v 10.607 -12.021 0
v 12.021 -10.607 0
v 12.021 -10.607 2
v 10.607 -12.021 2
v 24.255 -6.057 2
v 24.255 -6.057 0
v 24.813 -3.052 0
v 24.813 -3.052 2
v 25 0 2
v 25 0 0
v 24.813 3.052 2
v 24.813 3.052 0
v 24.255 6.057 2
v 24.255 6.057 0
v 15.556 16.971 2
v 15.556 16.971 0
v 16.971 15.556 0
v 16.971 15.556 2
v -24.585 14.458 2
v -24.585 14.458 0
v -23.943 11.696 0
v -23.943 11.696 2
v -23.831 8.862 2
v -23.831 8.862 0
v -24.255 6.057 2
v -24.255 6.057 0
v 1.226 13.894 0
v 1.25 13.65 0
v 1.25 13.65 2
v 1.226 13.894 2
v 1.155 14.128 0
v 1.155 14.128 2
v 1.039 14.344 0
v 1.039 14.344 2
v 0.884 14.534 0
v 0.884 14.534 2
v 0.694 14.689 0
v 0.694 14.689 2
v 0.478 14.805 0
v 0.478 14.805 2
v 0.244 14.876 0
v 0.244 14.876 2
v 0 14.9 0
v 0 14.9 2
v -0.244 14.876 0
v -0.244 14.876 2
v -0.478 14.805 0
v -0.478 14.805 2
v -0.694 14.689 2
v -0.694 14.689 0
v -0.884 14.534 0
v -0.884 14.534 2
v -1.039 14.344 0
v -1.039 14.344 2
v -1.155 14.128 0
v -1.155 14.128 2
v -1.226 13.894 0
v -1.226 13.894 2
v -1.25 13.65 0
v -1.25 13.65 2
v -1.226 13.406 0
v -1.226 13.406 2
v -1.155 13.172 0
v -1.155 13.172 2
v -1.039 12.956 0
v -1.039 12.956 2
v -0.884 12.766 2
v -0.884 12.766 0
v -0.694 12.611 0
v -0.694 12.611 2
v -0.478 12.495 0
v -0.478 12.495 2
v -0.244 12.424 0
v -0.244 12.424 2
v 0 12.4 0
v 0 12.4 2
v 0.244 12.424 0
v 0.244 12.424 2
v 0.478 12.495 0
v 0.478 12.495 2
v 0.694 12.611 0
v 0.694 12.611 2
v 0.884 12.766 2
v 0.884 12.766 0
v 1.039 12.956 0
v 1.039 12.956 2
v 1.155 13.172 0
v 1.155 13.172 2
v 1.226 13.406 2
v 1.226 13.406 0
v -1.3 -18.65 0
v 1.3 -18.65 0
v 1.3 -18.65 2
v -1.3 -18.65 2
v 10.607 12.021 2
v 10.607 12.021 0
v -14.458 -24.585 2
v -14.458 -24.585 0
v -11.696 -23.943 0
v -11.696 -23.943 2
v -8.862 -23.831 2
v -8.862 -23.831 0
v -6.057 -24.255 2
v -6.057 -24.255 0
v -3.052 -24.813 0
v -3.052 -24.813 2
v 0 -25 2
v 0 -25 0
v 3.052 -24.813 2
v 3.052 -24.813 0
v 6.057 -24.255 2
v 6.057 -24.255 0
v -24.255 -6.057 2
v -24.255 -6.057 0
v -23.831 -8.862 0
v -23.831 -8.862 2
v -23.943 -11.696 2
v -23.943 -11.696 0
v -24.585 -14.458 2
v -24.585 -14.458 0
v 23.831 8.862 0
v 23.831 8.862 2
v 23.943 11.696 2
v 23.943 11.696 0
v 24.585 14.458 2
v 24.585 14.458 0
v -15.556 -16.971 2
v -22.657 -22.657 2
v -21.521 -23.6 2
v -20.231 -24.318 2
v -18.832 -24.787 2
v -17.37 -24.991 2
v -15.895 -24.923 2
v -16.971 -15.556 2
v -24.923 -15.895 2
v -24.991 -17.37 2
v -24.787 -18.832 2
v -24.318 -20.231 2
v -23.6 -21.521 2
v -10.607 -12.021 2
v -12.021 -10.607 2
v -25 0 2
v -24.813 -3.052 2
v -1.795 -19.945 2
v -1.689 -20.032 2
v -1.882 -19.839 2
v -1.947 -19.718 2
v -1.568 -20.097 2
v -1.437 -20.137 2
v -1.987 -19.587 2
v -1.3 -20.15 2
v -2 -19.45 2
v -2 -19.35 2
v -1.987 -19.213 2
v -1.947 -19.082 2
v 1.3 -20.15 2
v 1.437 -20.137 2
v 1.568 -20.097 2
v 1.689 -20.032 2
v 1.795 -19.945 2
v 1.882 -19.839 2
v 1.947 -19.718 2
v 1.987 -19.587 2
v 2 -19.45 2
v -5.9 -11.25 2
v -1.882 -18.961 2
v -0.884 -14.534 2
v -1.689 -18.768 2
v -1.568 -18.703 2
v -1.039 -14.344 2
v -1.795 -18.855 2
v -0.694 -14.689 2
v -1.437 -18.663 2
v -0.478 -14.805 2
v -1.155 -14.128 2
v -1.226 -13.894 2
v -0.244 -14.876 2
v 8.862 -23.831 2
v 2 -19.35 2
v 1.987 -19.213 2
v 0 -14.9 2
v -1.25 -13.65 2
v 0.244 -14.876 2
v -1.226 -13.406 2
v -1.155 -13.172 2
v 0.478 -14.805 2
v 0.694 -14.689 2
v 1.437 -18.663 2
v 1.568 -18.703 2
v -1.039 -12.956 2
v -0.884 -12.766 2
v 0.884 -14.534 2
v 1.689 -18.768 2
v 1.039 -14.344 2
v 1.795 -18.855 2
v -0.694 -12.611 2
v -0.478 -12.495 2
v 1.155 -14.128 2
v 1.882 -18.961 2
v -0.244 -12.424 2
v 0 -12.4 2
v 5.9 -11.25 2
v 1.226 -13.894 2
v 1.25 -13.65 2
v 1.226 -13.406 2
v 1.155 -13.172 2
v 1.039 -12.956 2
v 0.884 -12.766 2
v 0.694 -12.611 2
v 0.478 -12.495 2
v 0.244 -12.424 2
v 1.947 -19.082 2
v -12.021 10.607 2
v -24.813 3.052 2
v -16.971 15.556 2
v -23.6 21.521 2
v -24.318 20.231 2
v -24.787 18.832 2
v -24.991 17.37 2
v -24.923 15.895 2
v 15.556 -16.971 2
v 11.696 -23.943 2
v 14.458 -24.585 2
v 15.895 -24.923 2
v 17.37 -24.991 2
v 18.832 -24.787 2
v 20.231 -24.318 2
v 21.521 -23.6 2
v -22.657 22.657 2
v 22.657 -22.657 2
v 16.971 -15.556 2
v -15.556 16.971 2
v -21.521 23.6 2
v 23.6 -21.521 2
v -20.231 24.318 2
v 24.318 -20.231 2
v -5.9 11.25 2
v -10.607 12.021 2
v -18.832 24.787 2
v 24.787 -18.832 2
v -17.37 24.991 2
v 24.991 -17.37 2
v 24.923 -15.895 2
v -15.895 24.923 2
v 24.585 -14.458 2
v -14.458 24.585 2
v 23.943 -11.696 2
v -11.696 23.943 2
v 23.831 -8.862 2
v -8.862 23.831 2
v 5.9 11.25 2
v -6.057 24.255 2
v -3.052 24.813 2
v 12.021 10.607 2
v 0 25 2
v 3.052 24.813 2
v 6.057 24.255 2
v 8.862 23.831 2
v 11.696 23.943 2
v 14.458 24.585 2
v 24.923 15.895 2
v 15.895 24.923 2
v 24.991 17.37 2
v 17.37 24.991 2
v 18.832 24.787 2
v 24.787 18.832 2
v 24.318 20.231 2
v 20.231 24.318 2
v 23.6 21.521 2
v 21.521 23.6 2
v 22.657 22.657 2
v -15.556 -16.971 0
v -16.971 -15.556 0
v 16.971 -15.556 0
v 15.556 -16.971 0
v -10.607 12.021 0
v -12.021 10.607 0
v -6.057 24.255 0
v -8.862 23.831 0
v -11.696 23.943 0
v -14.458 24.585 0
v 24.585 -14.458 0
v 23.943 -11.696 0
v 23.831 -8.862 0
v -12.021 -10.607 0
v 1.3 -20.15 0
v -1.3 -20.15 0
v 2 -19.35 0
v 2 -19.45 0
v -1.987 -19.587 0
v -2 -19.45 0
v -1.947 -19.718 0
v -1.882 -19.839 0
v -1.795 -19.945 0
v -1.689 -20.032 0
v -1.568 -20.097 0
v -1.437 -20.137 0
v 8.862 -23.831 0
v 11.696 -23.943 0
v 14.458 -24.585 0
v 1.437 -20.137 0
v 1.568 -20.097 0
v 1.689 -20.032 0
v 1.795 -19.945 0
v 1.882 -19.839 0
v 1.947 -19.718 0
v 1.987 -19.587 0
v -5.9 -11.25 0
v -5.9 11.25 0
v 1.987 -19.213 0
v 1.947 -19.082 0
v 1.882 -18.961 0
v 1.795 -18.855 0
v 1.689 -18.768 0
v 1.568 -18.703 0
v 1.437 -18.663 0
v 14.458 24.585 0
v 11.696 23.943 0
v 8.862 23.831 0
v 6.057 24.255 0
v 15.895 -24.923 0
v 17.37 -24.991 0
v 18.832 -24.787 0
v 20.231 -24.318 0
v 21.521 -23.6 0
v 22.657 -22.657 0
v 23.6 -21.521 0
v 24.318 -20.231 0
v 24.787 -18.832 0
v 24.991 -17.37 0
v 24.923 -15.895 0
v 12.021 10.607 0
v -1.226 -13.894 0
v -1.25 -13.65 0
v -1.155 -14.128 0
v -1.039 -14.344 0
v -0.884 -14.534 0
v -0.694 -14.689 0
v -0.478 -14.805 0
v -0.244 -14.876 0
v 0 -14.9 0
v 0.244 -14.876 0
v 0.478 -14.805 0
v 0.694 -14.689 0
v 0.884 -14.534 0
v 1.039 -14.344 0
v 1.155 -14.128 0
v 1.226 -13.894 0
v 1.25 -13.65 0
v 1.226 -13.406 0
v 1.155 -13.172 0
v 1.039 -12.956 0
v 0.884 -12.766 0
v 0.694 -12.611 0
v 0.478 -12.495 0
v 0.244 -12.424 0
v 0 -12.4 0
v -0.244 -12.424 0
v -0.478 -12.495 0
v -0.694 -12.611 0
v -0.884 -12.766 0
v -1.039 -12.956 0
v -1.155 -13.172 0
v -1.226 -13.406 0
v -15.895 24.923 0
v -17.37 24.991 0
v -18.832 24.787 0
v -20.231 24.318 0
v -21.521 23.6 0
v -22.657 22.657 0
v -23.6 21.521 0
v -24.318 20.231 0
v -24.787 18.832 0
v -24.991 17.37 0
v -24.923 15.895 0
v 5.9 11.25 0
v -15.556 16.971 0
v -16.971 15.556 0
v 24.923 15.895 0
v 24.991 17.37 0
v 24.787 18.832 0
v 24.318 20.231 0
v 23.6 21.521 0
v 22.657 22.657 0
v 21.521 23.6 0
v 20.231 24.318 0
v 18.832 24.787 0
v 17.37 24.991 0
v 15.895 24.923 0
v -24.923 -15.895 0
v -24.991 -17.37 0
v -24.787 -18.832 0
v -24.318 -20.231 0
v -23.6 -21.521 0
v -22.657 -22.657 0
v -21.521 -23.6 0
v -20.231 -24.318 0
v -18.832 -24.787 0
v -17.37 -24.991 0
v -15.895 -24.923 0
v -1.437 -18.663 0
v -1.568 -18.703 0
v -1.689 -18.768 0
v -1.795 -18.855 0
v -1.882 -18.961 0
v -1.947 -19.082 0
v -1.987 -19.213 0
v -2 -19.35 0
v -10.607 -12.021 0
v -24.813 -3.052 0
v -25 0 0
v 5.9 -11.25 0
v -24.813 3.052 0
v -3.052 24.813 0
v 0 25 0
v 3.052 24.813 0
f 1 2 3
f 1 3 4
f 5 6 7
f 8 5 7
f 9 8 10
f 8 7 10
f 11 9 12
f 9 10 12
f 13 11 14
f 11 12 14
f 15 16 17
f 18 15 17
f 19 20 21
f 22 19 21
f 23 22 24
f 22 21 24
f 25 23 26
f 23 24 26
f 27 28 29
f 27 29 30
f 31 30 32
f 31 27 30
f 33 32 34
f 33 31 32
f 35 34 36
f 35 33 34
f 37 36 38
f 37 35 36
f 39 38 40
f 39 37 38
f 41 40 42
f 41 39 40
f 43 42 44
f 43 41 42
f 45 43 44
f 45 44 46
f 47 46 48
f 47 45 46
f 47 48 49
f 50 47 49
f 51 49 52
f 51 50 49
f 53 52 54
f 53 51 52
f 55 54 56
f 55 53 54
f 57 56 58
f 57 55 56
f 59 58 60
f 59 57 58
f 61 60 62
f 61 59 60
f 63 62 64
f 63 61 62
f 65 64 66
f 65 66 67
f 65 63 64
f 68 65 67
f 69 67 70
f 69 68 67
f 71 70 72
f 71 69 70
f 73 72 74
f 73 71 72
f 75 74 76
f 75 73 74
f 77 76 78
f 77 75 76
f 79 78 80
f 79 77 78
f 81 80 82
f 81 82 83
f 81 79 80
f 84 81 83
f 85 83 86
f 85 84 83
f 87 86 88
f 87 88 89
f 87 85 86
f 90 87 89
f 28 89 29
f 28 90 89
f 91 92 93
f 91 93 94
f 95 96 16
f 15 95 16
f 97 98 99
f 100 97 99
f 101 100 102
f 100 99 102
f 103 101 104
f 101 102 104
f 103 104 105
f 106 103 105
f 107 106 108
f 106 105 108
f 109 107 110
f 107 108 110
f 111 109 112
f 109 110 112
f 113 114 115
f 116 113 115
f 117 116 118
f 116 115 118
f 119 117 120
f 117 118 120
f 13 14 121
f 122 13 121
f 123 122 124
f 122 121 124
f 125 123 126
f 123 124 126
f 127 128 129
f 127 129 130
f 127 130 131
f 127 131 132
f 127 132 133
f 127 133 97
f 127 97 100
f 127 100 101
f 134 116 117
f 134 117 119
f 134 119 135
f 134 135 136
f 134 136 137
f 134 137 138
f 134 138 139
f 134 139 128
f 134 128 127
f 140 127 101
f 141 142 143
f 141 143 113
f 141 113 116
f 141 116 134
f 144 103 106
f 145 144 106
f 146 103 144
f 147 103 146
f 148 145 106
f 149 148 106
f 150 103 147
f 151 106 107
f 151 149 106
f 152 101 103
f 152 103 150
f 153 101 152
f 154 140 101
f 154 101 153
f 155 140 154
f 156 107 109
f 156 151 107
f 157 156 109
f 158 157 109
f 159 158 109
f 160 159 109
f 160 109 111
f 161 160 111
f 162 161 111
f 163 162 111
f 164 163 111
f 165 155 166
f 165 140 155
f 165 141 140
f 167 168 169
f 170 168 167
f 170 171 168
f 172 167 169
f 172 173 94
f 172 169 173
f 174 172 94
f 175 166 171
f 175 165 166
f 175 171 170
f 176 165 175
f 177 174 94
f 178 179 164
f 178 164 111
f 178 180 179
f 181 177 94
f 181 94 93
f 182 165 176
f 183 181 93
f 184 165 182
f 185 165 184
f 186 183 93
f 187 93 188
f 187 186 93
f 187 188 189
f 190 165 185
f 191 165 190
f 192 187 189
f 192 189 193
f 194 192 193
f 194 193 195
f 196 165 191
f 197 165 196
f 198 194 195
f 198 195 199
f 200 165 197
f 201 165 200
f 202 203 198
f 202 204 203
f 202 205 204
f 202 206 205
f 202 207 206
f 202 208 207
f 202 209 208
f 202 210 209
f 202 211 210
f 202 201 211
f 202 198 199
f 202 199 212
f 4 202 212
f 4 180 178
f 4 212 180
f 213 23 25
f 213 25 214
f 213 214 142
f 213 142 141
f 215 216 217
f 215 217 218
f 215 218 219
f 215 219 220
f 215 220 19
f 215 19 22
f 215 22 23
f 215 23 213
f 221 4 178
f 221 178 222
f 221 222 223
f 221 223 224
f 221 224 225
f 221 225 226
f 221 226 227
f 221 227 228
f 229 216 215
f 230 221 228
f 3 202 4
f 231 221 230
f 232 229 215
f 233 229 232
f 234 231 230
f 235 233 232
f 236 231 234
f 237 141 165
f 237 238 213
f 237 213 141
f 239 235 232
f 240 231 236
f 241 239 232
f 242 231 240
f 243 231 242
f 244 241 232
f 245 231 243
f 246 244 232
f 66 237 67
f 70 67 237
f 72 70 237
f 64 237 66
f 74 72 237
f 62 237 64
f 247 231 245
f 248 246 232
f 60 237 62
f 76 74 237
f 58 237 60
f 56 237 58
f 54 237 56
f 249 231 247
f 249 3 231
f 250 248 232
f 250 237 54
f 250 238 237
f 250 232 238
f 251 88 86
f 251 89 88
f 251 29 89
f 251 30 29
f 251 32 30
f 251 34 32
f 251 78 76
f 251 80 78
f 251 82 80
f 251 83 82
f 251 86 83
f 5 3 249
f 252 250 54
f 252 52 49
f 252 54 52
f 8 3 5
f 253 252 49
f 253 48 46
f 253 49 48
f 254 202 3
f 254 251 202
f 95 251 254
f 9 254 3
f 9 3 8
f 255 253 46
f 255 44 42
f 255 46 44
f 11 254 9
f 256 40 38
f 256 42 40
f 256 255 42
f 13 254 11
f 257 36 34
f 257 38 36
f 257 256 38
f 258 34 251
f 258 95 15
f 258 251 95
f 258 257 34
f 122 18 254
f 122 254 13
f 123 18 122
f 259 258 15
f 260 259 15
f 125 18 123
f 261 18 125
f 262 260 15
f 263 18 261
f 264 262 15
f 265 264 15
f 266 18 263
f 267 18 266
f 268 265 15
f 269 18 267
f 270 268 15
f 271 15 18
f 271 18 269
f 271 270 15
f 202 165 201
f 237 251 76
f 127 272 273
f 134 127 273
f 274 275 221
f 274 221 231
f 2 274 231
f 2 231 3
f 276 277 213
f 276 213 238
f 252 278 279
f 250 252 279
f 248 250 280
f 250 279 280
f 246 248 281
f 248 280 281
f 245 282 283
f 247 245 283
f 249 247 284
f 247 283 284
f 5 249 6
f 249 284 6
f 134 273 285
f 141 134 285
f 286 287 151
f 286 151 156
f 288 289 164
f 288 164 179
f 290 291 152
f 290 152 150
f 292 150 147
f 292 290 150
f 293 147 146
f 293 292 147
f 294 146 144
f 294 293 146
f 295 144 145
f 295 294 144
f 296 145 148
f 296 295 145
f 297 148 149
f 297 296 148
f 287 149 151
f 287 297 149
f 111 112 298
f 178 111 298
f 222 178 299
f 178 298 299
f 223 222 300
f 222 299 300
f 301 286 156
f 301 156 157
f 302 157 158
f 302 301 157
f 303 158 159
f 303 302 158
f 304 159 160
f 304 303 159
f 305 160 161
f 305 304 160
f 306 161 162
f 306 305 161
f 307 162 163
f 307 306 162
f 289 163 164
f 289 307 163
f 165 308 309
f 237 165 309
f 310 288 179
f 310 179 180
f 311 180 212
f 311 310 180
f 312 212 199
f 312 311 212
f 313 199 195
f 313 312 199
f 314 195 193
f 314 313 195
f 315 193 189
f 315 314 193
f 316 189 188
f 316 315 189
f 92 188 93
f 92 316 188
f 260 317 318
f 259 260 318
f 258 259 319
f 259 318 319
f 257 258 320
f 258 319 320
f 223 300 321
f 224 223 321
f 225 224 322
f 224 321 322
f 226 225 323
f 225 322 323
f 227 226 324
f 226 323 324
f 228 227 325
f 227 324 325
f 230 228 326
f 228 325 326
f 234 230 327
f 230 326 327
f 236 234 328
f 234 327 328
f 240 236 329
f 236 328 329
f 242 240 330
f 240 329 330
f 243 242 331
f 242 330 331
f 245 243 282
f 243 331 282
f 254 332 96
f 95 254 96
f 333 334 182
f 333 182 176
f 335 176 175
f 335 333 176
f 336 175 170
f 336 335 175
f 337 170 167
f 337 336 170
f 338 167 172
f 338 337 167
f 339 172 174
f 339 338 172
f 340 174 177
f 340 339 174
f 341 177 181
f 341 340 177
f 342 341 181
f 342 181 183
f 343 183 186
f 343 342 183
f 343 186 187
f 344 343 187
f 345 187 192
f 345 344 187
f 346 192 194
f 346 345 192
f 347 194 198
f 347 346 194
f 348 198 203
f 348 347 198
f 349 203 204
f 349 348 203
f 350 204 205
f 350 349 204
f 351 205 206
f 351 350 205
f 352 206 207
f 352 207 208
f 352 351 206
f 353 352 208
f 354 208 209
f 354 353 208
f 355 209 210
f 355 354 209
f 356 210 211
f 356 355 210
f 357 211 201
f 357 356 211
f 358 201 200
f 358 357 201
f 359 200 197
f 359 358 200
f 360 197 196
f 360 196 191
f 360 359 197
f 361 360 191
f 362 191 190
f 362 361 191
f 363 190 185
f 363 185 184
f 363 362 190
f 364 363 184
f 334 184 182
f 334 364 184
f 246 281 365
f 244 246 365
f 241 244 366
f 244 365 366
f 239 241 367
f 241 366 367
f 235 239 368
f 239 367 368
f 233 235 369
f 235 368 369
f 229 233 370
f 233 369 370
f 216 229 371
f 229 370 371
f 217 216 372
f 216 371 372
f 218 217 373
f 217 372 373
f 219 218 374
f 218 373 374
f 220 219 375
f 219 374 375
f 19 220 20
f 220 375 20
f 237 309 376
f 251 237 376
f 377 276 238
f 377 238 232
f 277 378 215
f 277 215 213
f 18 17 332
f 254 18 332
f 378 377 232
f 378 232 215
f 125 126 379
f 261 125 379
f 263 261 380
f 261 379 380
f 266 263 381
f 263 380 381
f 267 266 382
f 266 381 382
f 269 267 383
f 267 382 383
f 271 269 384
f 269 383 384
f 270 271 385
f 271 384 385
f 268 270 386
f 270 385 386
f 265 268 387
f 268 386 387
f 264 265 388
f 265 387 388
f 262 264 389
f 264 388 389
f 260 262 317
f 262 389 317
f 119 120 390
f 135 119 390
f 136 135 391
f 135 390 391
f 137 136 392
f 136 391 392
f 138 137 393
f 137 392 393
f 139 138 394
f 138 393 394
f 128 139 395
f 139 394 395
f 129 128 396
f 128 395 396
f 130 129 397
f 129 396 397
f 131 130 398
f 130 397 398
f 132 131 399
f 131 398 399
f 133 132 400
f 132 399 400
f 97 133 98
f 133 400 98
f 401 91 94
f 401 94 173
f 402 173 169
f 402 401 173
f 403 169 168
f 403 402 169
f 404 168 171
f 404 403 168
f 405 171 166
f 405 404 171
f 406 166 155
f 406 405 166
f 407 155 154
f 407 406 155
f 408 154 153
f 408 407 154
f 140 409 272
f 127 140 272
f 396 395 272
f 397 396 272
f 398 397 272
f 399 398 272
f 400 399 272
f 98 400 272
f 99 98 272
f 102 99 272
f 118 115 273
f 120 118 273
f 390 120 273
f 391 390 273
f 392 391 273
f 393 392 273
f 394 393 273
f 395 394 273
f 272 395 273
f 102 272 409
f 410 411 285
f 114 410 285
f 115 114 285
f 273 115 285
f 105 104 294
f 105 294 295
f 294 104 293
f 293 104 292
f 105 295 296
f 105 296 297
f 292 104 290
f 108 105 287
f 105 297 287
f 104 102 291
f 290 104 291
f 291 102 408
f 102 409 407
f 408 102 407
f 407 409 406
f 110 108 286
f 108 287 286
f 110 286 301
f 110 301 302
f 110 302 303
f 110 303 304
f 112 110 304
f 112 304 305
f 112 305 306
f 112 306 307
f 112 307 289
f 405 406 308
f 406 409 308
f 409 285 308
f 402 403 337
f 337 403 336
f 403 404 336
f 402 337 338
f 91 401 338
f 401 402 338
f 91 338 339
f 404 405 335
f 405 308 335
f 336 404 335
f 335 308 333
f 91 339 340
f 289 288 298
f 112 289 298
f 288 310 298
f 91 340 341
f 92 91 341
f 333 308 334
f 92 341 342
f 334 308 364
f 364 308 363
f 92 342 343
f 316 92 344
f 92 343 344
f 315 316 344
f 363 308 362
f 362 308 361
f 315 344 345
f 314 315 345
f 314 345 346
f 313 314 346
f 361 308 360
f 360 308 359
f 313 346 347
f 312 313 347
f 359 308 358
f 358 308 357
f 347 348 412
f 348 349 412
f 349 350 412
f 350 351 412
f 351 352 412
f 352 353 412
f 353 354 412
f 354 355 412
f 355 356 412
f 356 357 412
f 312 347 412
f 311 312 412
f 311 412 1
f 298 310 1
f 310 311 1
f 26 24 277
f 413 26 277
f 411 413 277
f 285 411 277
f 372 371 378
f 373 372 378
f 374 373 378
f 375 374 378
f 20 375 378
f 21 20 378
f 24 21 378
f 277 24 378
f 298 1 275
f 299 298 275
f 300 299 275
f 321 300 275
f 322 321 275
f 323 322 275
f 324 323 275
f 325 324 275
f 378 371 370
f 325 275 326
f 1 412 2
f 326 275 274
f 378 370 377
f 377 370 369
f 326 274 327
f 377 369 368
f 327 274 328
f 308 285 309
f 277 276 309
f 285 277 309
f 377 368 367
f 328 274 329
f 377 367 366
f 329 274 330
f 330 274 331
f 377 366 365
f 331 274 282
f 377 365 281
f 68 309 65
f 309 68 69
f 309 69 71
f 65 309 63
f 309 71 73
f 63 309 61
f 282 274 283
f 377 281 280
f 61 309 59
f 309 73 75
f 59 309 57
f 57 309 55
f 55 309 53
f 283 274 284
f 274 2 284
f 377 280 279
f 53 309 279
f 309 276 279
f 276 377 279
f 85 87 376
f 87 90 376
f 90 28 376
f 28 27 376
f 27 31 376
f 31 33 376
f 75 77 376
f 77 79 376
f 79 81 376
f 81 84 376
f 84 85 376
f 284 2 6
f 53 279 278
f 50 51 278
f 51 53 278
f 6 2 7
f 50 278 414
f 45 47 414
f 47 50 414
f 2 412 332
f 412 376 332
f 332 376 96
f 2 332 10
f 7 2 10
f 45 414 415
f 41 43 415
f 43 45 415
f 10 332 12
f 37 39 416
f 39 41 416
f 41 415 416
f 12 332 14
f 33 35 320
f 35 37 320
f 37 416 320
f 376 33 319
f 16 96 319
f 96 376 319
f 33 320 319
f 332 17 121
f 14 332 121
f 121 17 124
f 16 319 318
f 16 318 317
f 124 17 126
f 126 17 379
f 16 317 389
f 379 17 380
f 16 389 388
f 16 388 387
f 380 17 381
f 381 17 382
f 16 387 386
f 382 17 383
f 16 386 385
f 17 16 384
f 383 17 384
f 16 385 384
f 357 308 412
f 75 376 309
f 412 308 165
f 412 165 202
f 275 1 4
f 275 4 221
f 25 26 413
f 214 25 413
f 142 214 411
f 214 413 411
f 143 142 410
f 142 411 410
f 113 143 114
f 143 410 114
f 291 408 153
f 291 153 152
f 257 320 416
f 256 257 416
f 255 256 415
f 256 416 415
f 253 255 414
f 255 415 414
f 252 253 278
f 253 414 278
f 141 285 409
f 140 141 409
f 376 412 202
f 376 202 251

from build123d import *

# Parameters (mm, degrees)
SKETCH1_R           = 1.25
SKETCH1_W           = 11.8
SKETCH1_H           = 22.5
BOSS_EXTRUDE1_DEPTH = 2


with BuildPart() as part:
    # Sketch1 → Boss-Extrude1 (new body)
    with BuildSketch(Plane.XY):
        with BuildLine():
            ThreePointArc((6.057454149, 24.255045851), (0, 25), (-6.057454149, 24.255045851))
            ThreePointArc((-6.057454149, 24.255045851), (-10.281376502, 23.819659541), (-14.458061439, 24.585416821))
            ThreePointArc((-14.458061439, 24.585416821), (-22.656854249, 22.656854249), (-24.585416821, 14.458061439))
            ThreePointArc((-24.585416821, 14.458061439), (-23.819659541, 10.281376502), (-24.255045851, 6.057454149))
            ThreePointArc((-24.255045851, 6.057454149), (-25, 0), (-24.255045851, -6.057454149))
            ThreePointArc((-24.255045851, -6.057454149), (-23.819659541, -10.281376502), (-24.585416821, -14.458061439))
            ThreePointArc((-24.585416821, -14.458061439), (-22.656854249, -22.656854249), (-14.458061439, -24.585416821))
            ThreePointArc((-14.458061439, -24.585416821), (-10.281376502, -23.819659541), (-6.057454149, -24.255045851))
            ThreePointArc((-6.057454149, -24.255045851), (0, -25), (6.057454149, -24.255045851))
            ThreePointArc((6.057454149, -24.255045851), (10.281376502, -23.819659541), (14.458061439, -24.585416821))
            ThreePointArc((14.458061439, -24.585416821), (22.656854249, -22.656854249), (24.585416821, -14.458061439))
            ThreePointArc((24.585416821, -14.458061439), (23.819659541, -10.281376502), (24.255045851, -6.057454149))
            ThreePointArc((24.255045851, -6.057454149), (25, 0), (24.255045851, 6.057454149))
            ThreePointArc((24.255045851, 6.057454149), (23.819659541, 10.281376502), (24.585416821, 14.458061439))
            ThreePointArc((24.585416821, 14.458061439), (22.656854249, 22.656854249), (14.458061439, 24.585416821))
            ThreePointArc((14.458061439, 24.585416821), (10.281376502, 23.819659541), (6.057454149, 24.255045851))
        make_face()
        with Locations((0, 13.65)):
            Circle(SKETCH1_R, mode=Mode.SUBTRACT)
        with Locations(Location((0, -13.65, 0), (0, 0, 180))):
            Circle(SKETCH1_R, mode=Mode.SUBTRACT)
        with BuildLine():
            Line((1.3, -18.65), (-1.3, -18.65))
            ThreePointArc((-1.3, -18.65), (-1.794974747, -18.855025253), (-2, -19.35))
            Line((-2, -19.35), (-2, -19.45))
            ThreePointArc((-2, -19.45), (-1.794974747, -19.944974747), (-1.3, -20.15))
            Line((-1.3, -20.15), (1.3, -20.15))
            ThreePointArc((1.3, -20.15), (1.794974747, -19.944974747), (2, -19.45))
            Line((2, -19.45), (2, -19.35))
            ThreePointArc((2, -19.35), (1.794974747, -18.855025253), (1.3, -18.65))
        make_face(mode=Mode.SUBTRACT)
        Rectangle(SKETCH1_W, SKETCH1_H, mode=Mode.SUBTRACT)
        Polygon((-12.02081528, 10.606601718), (-10.606601718, 12.02081528), (-15.556349186, 16.970562748), (-16.970562748, 15.556349186), align=None, mode=Mode.SUBTRACT)
        Polygon((10.606601718, 12.02081528), (15.556349186, 16.970562748), (16.970562748, 15.556349186), (12.02081528, 10.606601718), align=None, mode=Mode.SUBTRACT)
        Polygon((12.02081528, -10.606601718), (10.606601718, -12.02081528), (15.556349186, -16.970562748), (16.970562748, -15.556349186), align=None, mode=Mode.SUBTRACT)
        Polygon((-16.970562748, -15.556349186), (-12.02081528, -10.606601718), (-10.606601718, -12.02081528), (-15.556349186, -16.970562748), align=None, mode=Mode.SUBTRACT)
    extrude(amount=BOSS_EXTRUDE1_DEPTH)


solid = part.part
